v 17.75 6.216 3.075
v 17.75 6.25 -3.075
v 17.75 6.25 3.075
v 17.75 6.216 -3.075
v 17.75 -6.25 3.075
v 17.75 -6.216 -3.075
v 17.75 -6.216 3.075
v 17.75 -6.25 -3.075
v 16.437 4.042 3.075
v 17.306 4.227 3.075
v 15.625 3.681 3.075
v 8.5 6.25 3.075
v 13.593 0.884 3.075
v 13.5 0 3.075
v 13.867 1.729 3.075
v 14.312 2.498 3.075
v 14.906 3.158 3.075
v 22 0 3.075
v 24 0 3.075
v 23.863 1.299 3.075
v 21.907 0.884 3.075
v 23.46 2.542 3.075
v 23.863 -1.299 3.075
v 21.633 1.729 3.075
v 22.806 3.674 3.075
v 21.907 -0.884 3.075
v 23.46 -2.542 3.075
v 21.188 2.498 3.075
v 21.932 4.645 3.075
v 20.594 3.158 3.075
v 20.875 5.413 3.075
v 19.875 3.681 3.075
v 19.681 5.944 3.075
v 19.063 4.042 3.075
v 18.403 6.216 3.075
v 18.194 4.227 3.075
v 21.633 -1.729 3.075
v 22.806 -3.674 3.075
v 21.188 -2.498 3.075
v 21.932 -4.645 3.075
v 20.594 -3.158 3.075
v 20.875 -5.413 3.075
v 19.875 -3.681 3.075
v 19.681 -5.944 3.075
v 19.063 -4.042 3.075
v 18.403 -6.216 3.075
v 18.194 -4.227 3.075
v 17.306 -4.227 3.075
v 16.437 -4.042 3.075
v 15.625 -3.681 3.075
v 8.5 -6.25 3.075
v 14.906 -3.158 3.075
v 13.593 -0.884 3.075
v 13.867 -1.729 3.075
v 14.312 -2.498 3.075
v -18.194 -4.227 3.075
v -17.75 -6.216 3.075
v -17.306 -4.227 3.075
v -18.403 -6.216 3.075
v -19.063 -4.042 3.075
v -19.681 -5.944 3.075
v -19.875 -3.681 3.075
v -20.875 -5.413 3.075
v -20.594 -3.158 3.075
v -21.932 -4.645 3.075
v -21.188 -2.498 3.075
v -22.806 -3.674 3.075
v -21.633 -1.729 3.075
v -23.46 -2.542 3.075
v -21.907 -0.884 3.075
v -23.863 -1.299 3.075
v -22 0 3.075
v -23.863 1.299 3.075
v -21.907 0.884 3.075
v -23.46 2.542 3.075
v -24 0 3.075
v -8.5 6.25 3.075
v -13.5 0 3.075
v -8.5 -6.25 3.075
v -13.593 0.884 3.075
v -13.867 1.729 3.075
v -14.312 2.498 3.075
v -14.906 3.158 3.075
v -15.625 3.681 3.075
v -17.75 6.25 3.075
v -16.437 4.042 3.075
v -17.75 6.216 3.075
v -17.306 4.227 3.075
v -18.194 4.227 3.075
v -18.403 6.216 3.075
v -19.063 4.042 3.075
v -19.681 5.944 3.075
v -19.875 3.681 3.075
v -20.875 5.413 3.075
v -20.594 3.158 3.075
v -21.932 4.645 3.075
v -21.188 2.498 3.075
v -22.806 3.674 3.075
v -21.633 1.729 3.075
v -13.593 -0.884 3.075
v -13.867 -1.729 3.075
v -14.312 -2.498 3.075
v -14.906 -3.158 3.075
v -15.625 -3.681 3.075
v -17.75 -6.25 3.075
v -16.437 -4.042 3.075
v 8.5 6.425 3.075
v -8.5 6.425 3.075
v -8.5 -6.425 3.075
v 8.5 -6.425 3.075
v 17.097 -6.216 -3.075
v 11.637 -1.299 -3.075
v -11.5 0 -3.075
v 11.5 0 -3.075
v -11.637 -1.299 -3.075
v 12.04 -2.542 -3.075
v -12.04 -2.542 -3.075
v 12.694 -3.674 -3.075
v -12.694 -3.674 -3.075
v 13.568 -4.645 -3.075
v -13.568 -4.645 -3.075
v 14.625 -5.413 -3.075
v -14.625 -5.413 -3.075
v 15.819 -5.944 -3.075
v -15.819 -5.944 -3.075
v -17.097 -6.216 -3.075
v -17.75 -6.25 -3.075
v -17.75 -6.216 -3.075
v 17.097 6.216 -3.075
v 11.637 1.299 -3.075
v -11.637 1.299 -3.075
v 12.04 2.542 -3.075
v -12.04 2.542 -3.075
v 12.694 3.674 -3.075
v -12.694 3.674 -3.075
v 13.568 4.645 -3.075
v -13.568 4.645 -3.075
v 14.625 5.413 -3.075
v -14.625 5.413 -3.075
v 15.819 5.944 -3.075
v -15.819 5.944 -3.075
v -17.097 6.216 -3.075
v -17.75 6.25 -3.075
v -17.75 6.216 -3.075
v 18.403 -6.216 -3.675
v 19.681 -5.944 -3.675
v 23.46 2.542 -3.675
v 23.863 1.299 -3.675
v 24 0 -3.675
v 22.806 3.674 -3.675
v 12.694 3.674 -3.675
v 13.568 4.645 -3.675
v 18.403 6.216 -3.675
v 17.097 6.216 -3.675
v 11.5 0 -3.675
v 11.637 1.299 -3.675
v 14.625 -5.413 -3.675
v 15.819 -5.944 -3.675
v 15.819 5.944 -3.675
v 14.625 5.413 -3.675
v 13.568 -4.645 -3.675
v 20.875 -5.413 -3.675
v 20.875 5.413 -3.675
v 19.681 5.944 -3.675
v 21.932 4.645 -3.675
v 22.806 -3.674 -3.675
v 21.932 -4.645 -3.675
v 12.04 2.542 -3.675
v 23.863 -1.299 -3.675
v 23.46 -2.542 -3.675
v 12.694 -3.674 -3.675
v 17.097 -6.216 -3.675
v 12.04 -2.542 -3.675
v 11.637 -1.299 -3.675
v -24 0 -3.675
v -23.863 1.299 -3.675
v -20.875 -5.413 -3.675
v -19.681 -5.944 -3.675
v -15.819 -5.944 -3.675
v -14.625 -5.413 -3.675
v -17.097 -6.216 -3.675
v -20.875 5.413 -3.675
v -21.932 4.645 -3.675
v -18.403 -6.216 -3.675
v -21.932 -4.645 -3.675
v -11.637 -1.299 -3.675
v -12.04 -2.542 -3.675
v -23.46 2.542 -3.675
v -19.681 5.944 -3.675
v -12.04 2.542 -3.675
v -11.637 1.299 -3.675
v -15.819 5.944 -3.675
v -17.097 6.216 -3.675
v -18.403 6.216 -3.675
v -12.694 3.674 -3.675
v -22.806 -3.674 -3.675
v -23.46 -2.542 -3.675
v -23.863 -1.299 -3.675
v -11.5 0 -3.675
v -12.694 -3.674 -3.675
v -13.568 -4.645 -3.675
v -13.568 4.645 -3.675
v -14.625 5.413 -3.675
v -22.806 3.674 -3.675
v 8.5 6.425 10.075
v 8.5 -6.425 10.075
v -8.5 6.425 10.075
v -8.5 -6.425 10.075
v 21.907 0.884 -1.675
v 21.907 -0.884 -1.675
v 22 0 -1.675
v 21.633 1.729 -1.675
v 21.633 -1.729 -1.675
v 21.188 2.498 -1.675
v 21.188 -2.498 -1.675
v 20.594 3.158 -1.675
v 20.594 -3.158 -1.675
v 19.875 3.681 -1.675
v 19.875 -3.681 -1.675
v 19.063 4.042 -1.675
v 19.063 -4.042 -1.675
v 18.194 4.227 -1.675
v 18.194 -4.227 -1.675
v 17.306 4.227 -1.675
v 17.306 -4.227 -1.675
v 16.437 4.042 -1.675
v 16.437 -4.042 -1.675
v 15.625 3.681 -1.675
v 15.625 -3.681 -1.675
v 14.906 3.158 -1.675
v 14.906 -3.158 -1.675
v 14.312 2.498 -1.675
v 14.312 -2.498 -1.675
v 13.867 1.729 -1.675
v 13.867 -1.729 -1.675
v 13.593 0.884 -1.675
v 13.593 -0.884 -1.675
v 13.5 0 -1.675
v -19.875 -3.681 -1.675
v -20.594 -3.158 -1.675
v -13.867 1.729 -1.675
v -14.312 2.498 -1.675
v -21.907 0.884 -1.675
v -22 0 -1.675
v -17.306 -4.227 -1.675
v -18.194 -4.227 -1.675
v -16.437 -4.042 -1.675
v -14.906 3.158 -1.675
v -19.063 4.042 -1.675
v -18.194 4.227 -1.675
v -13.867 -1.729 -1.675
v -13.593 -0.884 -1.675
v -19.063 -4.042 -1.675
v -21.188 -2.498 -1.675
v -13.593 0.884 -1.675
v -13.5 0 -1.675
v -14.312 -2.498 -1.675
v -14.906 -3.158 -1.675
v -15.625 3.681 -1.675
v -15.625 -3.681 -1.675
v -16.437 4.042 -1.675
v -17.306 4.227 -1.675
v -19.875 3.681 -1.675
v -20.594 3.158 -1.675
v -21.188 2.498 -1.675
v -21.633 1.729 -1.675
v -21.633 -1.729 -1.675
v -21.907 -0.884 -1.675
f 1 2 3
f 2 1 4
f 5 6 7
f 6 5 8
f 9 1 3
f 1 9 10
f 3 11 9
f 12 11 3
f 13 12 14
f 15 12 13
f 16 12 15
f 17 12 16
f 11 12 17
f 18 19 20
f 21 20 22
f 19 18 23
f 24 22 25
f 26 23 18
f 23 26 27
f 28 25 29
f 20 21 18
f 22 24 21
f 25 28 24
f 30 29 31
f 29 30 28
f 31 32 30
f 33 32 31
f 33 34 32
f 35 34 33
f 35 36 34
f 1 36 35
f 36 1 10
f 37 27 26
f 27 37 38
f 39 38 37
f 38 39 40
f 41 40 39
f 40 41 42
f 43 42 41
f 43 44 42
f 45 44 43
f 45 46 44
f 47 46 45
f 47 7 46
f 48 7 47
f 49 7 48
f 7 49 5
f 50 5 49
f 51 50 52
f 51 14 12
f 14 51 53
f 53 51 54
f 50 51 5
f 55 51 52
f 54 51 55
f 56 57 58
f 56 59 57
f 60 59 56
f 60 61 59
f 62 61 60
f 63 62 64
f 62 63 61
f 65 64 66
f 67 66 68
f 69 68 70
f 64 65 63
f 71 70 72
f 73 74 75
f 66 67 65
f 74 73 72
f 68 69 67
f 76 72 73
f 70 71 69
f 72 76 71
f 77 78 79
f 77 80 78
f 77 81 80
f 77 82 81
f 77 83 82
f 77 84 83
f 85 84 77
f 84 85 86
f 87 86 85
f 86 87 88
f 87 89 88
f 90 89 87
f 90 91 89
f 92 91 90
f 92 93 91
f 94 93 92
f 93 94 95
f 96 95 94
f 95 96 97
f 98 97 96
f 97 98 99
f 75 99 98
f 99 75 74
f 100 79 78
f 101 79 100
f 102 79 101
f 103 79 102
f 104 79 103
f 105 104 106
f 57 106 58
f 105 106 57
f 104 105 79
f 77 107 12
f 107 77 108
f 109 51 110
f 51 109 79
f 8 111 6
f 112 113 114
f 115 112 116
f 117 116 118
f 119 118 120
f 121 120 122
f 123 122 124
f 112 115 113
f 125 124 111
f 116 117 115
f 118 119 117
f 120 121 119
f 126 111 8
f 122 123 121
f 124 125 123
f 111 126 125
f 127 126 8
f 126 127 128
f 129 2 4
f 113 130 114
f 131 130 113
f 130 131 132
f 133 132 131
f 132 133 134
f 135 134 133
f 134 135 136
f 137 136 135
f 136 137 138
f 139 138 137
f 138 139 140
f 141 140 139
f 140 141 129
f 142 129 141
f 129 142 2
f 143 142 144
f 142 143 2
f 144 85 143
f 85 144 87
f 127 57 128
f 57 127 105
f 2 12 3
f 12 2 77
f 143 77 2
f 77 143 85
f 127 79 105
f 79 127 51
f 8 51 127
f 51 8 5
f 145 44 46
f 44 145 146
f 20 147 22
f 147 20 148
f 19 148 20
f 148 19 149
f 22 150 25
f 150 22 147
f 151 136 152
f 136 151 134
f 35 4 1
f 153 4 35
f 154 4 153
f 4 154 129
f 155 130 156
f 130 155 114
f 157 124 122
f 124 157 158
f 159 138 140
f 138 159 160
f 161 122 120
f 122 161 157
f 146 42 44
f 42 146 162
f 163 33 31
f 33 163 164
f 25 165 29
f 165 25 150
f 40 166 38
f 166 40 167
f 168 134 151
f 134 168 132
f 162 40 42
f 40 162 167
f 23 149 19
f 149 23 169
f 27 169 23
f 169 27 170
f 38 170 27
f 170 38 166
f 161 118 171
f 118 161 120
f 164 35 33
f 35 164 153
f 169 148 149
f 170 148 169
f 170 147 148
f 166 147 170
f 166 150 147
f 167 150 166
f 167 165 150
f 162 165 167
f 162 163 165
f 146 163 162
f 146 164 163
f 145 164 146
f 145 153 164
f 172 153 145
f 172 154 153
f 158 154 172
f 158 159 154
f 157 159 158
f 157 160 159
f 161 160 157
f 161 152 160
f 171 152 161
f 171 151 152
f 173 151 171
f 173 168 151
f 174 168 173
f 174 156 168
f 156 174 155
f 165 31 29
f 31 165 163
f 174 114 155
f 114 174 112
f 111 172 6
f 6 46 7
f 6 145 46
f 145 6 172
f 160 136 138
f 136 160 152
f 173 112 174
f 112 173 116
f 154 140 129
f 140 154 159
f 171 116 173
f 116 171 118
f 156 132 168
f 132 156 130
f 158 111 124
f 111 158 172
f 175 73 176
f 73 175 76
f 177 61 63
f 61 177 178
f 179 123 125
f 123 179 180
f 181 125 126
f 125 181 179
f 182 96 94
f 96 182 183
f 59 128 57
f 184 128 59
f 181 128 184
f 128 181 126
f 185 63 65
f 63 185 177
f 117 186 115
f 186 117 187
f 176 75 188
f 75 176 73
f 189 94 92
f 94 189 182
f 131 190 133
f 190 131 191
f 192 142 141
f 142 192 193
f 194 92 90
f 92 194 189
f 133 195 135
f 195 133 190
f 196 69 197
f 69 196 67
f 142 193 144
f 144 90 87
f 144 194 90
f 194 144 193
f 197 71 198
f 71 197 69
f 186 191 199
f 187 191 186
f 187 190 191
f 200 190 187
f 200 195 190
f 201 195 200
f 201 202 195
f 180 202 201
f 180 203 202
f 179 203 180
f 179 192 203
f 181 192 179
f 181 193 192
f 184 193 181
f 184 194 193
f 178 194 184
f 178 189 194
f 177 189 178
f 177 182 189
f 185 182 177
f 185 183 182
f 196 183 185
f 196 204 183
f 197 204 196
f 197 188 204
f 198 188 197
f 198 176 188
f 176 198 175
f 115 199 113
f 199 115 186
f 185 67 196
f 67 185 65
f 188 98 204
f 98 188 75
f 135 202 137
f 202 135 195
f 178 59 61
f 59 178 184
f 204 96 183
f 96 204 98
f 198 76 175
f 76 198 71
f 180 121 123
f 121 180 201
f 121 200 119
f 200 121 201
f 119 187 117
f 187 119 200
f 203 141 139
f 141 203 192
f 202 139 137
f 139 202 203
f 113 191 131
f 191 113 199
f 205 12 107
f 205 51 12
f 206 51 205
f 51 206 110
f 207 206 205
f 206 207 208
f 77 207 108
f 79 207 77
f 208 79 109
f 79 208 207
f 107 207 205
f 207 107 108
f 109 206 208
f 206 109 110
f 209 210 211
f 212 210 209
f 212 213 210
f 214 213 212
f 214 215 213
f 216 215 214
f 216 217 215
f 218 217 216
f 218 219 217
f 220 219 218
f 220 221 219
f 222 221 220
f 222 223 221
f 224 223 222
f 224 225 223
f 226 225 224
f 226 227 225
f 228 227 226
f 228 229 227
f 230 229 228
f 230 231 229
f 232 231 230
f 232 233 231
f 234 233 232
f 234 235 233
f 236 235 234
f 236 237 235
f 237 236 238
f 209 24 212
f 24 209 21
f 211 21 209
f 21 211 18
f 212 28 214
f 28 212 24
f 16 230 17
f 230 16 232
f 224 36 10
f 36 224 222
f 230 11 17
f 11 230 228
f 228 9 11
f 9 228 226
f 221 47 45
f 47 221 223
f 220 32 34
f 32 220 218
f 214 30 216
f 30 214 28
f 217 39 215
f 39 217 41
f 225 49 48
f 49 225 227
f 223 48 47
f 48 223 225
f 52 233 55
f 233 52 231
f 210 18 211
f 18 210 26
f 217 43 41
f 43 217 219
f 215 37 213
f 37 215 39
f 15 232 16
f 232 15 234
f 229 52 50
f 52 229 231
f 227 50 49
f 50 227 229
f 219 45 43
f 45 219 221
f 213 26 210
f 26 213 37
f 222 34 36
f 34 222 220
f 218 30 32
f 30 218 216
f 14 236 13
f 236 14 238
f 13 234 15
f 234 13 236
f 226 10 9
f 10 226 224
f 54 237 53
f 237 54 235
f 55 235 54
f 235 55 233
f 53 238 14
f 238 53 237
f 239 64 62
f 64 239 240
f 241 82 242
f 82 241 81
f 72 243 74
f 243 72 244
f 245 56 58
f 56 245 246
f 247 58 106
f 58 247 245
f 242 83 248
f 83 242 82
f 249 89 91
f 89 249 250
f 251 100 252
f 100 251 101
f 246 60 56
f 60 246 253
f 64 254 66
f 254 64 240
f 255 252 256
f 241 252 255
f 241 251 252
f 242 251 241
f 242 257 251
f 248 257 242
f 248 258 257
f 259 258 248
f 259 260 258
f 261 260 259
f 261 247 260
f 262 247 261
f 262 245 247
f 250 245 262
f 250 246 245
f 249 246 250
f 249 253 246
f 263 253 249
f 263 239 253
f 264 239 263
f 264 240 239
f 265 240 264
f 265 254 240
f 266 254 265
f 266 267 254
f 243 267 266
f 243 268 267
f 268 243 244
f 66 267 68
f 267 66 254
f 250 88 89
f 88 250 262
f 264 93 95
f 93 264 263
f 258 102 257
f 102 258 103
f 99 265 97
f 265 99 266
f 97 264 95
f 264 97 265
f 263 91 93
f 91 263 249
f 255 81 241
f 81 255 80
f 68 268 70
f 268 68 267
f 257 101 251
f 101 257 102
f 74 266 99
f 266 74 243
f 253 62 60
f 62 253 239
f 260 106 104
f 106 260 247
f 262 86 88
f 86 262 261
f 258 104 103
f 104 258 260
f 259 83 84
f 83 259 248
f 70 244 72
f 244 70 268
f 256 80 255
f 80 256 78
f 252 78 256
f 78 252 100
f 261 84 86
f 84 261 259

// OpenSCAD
$fn = 30;

link_w = 48;
link_l = 12.5;
link_h = 24.3;

linkco_d = link_l; //link circle outter diameter
linkc_width = 2; //link circle wall thickness
linkc_h = 6.75;  // z (height)


socket_difference_d = 13;

tendon_w = 17;
tendon_l = 12.85;
tendon_h = 7;

base_h = 6.15;

base_render();

module linkage_1(){


}


module base_render(){//stuff and substract stuff
    difference(){
        base();
        base_diff();
    }
    
}
module base(){
    cube([link_w - linkco_d, link_l, base_h], center =true);
    base_circle();
    mirror([1,0,0])
    base_circle();
    tendon();
}

module base_diff(){
    base_circle_diff();
    mirror([1,0,0])
    base_circle_diff();
}

module base_circle(){
        color("red")
        translate([link_w/2 - linkco_d/2,0,-(linkc_h - base_h)/2])
        cylinder(h = linkc_h, d = linkco_d, center = true);
 
}

module base_circle_diff(){
    color("green")
    translate([link_w/2 - linkco_d/2,0,-(linkc_h - base_h)/2 + linkc_width/2])
    cylinder(h = linkc_h - linkc_width, d = linkco_d - (linkc_width*2), center = true); 
}

module tendon(){
    translate([0,0,tendon_h/2 + base_h/2])
    cube([tendon_w, tendon_l, tendon_h], center=true);
}
